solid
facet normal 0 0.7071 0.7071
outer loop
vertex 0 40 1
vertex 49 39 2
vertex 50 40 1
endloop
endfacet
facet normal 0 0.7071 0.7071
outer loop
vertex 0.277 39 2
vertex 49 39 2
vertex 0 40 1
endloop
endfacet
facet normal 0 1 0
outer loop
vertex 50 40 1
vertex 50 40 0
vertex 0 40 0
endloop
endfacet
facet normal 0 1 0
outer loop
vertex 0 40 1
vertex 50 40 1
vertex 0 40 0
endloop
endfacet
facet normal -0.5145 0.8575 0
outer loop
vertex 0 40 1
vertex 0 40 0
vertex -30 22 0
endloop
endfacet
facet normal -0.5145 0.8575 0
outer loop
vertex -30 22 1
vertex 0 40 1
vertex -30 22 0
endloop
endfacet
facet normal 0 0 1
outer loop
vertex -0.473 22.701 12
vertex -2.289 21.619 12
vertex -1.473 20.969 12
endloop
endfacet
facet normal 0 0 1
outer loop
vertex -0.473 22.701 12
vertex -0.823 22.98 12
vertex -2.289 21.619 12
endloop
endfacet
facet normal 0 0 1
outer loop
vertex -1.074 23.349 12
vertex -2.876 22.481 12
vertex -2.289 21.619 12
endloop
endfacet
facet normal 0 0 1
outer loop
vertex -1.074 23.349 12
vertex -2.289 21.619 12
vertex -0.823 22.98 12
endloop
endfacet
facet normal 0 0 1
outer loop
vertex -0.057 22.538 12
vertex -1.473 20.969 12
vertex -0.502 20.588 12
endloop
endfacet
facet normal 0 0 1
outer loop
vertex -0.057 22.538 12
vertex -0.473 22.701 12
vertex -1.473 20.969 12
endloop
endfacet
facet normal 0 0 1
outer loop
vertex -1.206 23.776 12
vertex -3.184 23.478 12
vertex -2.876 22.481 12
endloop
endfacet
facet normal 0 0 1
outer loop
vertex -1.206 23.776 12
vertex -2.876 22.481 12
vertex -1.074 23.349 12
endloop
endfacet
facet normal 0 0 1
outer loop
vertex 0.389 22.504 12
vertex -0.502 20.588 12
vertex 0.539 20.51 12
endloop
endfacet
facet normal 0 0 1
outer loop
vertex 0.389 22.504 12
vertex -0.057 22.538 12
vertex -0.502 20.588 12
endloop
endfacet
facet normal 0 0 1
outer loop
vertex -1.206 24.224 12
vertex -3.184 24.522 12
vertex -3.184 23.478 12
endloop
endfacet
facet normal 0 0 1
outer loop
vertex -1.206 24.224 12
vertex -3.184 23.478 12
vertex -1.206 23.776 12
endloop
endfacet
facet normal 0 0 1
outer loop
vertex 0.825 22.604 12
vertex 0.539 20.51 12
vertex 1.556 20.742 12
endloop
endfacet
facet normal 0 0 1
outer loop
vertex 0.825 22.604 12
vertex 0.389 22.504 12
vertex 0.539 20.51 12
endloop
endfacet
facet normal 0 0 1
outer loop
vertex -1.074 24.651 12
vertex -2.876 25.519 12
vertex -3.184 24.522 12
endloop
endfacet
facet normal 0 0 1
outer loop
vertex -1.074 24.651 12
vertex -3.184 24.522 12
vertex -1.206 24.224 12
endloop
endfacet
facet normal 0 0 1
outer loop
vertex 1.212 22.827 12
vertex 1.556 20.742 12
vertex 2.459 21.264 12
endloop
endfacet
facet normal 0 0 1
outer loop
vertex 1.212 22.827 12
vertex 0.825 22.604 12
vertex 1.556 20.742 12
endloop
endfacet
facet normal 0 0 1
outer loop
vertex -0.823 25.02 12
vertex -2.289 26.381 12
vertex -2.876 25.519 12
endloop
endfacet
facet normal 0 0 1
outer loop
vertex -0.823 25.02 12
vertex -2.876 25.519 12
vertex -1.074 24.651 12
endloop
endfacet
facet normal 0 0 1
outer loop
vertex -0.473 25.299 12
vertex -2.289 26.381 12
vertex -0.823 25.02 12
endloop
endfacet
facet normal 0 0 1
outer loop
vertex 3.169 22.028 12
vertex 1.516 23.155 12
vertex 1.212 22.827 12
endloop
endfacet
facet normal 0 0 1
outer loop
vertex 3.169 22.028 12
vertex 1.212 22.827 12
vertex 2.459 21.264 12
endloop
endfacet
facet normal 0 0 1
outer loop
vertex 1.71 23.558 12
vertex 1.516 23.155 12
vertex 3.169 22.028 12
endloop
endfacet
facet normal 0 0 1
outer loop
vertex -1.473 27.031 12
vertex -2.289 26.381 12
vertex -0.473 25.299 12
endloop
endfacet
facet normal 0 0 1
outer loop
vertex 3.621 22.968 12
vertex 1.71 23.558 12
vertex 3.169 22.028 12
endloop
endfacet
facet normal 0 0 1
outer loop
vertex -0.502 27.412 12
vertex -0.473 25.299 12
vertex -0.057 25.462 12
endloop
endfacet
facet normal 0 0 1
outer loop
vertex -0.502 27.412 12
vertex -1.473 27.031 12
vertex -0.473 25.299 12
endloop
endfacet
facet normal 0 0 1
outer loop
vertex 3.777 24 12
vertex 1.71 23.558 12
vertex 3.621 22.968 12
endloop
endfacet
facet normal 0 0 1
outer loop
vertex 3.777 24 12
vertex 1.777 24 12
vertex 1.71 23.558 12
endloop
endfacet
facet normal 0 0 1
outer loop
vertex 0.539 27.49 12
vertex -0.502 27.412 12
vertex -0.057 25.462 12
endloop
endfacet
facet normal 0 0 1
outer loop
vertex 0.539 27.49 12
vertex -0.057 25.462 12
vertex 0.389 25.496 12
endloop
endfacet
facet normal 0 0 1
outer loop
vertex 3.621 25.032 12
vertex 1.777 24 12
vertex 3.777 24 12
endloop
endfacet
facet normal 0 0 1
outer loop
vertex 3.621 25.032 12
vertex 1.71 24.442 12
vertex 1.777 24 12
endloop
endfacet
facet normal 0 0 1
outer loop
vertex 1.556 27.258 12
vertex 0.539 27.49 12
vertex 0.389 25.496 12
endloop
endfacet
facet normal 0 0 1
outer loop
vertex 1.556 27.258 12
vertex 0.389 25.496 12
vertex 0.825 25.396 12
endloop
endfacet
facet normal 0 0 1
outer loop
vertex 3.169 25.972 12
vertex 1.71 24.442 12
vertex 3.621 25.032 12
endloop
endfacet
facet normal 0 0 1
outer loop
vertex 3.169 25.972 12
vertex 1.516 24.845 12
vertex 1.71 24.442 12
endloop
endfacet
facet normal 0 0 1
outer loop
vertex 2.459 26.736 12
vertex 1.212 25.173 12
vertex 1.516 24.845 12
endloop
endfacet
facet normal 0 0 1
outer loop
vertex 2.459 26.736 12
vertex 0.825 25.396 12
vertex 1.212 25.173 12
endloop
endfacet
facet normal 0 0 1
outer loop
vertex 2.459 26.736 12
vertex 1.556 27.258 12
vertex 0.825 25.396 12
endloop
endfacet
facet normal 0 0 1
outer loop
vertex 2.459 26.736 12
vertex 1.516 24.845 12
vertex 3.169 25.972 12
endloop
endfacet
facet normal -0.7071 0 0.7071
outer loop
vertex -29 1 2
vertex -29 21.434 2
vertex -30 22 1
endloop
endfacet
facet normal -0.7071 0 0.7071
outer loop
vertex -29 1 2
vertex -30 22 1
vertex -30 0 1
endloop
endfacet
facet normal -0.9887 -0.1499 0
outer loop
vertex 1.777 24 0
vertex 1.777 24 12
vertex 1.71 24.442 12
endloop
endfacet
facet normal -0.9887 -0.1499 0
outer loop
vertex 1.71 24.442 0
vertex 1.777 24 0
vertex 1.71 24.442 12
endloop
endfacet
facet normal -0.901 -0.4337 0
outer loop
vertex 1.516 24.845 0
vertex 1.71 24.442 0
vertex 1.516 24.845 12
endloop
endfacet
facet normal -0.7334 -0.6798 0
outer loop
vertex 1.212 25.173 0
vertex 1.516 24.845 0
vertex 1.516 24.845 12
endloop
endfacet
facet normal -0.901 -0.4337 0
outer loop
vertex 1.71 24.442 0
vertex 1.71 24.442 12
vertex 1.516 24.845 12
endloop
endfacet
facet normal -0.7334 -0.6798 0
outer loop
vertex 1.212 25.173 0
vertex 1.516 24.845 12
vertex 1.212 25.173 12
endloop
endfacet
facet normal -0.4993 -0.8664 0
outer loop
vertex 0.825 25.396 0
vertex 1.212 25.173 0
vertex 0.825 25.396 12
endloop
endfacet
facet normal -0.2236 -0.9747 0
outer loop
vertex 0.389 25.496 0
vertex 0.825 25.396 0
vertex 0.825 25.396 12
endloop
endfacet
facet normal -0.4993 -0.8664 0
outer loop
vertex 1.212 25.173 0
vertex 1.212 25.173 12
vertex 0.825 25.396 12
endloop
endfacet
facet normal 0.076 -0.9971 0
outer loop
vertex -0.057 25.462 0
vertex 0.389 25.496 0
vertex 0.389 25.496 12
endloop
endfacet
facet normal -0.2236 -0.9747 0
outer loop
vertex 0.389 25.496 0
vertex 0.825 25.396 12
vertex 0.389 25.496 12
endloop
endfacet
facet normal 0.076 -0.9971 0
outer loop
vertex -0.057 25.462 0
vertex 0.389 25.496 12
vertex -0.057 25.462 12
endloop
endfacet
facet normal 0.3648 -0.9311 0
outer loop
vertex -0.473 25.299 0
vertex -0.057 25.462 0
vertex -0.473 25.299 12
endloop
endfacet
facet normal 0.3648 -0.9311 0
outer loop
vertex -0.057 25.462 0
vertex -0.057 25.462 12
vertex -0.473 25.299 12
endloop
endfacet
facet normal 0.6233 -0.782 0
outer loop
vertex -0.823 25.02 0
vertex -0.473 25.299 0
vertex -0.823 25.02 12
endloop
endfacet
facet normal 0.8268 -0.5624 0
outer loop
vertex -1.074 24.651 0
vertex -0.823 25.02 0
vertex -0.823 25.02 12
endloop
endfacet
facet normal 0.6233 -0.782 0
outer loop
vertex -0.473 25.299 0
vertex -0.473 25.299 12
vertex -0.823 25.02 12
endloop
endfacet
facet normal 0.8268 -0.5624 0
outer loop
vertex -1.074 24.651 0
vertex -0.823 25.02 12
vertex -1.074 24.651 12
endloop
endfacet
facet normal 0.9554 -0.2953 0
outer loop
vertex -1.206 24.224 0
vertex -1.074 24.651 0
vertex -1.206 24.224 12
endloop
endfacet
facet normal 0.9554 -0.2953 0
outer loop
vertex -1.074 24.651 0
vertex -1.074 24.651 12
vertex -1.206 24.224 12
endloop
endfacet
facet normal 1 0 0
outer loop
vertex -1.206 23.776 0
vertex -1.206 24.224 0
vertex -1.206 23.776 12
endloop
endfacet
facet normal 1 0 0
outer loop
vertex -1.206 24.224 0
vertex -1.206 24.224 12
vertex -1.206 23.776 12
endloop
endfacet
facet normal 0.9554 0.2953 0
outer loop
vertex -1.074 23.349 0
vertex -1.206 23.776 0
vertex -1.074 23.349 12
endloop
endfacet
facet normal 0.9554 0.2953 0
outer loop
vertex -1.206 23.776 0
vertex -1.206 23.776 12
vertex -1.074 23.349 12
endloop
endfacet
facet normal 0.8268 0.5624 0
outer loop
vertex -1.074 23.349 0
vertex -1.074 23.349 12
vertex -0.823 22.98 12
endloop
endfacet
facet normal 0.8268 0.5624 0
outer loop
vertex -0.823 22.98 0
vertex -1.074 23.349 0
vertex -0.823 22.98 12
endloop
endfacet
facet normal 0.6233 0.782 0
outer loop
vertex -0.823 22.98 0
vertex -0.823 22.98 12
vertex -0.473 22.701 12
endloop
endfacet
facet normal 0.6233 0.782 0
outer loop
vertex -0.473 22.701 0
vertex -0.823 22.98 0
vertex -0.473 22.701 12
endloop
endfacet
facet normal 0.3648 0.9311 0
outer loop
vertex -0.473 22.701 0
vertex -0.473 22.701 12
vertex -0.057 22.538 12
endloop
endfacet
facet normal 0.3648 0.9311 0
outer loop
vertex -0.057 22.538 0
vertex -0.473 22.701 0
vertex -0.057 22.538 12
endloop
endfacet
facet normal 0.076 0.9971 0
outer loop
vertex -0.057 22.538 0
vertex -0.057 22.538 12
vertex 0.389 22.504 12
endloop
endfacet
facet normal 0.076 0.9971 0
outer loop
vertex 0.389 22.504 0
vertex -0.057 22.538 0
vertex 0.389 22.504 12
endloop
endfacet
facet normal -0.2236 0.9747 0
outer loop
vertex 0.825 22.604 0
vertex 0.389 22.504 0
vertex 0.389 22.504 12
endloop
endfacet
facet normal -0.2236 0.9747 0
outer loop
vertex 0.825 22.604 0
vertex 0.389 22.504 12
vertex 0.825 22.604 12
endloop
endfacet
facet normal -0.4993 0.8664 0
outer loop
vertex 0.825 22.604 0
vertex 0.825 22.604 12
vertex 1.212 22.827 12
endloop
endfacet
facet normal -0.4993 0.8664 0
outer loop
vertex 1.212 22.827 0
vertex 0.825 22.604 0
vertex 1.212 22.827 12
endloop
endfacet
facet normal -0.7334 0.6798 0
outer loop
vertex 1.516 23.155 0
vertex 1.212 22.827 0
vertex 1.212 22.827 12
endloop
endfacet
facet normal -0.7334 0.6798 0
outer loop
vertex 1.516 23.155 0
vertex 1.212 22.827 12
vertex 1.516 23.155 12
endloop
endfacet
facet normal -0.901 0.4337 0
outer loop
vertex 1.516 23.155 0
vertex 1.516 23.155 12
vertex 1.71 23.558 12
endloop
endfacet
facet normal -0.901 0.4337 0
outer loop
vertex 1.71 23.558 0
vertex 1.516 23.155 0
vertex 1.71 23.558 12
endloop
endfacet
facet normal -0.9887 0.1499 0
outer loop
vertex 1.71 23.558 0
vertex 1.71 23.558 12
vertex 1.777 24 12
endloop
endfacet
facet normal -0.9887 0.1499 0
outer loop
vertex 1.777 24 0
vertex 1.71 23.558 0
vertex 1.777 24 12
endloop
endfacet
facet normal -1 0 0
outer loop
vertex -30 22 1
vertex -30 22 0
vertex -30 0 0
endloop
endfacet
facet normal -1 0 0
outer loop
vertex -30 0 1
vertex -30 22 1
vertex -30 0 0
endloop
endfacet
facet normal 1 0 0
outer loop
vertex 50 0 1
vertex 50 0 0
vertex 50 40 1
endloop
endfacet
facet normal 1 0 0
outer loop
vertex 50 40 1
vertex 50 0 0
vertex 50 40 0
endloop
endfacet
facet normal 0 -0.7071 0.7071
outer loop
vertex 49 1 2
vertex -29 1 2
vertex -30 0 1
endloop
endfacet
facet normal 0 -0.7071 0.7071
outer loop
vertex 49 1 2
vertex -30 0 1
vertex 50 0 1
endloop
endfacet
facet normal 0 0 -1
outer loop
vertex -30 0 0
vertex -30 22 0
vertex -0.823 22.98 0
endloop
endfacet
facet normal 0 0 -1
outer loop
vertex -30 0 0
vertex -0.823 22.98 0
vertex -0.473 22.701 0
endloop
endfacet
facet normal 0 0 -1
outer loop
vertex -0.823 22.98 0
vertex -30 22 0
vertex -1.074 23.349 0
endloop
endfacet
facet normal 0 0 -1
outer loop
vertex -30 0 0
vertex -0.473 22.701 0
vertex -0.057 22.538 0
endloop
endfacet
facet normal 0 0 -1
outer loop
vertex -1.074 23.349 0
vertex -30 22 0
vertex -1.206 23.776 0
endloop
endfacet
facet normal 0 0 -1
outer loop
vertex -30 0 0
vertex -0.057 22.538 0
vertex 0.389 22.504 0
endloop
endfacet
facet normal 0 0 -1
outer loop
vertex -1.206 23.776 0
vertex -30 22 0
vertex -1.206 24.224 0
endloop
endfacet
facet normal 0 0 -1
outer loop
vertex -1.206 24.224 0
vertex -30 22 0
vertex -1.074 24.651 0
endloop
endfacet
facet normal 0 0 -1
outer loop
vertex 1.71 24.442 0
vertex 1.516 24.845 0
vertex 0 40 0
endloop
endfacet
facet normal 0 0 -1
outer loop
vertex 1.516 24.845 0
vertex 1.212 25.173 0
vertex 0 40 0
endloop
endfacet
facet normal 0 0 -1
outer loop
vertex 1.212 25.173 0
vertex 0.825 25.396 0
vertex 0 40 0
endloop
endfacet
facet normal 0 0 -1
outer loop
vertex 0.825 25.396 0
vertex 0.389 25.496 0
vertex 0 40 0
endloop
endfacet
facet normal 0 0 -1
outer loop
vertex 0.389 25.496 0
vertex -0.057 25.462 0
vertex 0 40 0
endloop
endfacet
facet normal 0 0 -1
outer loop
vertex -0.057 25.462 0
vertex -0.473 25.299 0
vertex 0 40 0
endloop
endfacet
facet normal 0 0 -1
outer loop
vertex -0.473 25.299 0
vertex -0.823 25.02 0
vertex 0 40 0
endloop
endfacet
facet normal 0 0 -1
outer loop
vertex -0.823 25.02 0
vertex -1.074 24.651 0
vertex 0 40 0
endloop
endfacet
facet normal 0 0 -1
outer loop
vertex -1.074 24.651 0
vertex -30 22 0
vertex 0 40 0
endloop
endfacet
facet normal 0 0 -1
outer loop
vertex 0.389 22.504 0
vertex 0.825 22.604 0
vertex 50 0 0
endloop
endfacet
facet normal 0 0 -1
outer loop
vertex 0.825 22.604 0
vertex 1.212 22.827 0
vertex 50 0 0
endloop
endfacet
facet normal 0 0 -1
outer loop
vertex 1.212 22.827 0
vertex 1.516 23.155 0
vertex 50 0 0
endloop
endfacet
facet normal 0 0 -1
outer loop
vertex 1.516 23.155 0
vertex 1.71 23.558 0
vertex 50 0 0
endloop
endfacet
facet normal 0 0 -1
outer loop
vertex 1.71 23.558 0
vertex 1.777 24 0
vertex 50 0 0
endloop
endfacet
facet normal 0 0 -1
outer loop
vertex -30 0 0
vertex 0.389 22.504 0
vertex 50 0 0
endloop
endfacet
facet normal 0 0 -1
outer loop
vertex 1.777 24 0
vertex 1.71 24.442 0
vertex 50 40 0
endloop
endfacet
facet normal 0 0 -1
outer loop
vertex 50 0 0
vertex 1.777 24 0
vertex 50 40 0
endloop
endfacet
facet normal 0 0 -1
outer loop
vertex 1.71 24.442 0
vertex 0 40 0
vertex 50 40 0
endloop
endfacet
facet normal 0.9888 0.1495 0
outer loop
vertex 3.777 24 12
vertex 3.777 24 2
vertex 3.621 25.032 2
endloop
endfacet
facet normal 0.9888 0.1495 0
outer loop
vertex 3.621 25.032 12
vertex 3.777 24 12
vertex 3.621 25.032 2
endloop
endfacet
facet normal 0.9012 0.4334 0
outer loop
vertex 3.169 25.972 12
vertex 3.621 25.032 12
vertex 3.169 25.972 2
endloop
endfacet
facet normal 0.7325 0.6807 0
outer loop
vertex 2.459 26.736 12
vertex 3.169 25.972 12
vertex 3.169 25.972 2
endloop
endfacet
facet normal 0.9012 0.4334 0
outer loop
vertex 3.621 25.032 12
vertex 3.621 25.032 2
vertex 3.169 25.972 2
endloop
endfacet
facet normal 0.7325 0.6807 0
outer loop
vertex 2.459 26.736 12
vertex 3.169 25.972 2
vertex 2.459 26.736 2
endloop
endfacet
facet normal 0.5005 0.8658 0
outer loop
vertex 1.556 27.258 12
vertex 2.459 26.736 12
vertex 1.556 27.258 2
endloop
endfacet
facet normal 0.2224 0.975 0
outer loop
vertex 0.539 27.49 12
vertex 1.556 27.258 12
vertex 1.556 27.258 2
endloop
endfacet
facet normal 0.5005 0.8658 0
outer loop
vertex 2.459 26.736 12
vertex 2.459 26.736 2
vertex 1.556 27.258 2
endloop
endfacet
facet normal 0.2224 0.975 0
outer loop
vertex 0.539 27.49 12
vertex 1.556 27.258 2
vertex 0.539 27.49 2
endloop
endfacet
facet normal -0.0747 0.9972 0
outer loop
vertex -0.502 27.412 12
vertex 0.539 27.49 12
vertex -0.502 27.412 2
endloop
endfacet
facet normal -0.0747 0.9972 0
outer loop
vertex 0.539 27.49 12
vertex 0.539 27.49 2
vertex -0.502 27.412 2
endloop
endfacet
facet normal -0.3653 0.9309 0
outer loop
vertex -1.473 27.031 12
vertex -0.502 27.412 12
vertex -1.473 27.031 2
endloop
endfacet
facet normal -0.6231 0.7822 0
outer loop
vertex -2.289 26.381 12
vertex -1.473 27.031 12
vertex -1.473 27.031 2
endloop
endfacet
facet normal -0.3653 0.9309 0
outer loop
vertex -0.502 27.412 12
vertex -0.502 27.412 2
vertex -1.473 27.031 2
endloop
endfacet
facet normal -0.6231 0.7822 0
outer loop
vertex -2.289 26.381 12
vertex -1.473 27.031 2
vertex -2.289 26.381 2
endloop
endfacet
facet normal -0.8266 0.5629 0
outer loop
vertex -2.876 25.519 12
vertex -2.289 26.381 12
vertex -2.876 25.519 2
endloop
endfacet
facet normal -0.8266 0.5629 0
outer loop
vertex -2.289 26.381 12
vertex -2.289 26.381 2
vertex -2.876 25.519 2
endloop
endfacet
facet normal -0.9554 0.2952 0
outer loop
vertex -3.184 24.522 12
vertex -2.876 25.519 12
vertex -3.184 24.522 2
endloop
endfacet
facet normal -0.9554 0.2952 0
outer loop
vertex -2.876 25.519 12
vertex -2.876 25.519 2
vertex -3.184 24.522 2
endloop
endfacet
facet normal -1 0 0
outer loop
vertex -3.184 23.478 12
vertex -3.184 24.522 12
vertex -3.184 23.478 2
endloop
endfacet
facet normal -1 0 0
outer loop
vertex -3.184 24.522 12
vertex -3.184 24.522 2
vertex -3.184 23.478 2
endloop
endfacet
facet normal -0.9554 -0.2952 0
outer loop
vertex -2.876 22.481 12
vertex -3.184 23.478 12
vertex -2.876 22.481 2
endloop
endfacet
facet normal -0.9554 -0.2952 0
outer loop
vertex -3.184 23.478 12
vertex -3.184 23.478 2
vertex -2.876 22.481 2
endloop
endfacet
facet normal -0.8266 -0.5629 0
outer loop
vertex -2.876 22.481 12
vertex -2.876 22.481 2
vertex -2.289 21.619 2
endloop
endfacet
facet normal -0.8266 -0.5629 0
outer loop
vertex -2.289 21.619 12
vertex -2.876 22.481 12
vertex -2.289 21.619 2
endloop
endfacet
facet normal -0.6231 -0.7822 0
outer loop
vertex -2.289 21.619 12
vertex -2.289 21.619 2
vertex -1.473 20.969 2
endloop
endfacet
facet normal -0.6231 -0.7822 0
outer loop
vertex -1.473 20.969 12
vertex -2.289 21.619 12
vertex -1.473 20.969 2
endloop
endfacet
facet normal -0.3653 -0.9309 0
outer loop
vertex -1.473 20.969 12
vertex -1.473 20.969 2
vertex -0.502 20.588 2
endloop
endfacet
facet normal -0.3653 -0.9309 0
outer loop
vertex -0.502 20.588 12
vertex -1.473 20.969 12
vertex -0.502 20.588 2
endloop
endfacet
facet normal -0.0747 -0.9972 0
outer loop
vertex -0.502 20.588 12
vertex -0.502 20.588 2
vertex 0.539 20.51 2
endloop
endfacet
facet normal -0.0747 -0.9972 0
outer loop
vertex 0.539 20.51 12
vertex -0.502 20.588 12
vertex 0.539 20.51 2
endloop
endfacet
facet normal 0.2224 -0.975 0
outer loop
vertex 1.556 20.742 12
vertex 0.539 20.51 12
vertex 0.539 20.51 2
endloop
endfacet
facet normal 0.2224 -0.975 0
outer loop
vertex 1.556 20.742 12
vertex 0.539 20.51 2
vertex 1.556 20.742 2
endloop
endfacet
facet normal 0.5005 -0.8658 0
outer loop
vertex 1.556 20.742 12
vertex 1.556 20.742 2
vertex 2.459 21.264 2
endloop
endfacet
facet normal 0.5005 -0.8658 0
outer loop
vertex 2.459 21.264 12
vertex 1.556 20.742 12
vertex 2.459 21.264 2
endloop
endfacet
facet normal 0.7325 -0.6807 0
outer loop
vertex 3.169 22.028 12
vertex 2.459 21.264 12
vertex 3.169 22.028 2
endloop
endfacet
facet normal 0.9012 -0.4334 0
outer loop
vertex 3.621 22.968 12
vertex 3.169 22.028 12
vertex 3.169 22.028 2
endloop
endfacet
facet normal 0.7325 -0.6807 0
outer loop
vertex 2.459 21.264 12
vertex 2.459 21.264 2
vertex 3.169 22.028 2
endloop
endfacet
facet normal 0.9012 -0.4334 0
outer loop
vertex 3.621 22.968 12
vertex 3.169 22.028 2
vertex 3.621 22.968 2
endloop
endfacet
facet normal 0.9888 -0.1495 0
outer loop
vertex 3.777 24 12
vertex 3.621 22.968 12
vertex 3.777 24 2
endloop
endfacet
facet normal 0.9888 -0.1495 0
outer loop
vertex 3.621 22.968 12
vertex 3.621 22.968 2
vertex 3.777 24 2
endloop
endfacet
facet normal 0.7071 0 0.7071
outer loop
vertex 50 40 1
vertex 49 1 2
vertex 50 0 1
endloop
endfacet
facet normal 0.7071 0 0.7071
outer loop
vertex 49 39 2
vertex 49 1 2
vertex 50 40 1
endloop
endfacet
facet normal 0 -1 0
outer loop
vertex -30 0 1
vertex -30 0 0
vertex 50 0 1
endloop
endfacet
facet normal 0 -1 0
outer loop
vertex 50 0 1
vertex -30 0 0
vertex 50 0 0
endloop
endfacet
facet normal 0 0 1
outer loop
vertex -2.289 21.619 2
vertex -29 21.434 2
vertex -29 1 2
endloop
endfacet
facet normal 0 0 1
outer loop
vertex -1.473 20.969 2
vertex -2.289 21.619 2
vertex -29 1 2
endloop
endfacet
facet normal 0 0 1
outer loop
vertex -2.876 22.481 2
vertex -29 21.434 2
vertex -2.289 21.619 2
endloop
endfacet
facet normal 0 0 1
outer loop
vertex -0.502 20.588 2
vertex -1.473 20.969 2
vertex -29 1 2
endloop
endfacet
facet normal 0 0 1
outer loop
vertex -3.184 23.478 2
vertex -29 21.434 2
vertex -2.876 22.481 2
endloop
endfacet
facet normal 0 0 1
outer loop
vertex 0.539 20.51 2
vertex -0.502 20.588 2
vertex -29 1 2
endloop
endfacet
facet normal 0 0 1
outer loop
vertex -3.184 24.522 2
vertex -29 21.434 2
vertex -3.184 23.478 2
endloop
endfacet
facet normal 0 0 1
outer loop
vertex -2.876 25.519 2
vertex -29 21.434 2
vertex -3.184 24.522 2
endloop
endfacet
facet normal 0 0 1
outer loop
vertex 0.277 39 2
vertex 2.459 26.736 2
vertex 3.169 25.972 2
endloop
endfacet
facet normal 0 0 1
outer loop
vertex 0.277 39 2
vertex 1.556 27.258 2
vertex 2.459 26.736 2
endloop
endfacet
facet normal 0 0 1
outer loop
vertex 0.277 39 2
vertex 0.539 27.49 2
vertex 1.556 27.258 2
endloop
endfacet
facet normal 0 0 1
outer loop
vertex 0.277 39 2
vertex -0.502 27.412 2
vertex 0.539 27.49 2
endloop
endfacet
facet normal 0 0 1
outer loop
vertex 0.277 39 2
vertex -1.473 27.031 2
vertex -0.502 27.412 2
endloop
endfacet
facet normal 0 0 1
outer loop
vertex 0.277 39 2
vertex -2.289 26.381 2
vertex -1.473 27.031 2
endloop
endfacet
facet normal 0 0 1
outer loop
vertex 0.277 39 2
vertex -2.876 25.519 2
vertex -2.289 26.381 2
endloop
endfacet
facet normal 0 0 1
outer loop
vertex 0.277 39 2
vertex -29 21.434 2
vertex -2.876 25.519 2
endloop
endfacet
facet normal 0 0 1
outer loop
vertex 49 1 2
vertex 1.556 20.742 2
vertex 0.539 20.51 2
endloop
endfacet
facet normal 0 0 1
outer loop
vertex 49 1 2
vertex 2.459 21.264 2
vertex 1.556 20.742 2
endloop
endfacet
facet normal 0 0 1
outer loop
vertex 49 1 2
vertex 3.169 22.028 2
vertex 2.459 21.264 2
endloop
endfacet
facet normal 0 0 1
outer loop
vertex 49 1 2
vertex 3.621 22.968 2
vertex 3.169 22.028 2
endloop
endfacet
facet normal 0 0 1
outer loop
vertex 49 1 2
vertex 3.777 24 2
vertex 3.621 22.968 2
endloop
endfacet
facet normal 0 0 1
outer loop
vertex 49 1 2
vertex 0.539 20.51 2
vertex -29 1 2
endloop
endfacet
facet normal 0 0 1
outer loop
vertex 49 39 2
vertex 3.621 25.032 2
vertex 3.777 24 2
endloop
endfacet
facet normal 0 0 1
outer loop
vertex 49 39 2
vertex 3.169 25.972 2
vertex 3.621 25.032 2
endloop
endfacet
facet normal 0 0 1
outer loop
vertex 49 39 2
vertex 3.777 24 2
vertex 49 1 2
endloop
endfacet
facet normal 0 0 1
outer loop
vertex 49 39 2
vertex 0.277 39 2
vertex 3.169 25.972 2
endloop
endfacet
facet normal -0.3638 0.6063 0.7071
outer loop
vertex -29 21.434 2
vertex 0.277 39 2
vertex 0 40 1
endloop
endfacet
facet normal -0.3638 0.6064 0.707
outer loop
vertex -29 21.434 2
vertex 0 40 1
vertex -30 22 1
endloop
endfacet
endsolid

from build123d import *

# Parameters (mm, degrees)
F1_DEPTH = 2
F2_SIZE  = 1
F3_R     = 3.5
F4_DEPTH = 10
F5_R     = 1.5
F6_DEPTH = 15


with BuildPart() as f1:
    # F0 (on Top) → F1 (new body)
    with BuildSketch(Plane.XY):
        Polygon((-30, 0), (0, 0), (50, 0), (50, 40), (0, 40), (-30, 22), align=None)
    extrude(amount=F1_DEPTH)

    # F2
    f2_edges = [f1.edges().sort_by_distance(p)[0] for p in [
        (10, 0, 2),
        (-30, 11, 2),
        (-15, 31, 2),
        (25, 40, 2),
        (50, 20, 2),
    ]]
    chamfer(f2_edges, length=F2_SIZE)

    # F3 (on face) → F4 (join)
    with BuildSketch(Plane.XY.offset(2)):
        with Locations((0.276984, 24)):
            Circle(F3_R)
    extrude(amount=F4_DEPTH)

    # F5 (on face) → F6 (cut)
    with BuildSketch(Plane.XY.offset(12)):
        with Locations((0.276984, 24)):
            Circle(F5_R)
    extrude(amount=-F6_DEPTH, mode=Mode.SUBTRACT)


solid = f1.part
